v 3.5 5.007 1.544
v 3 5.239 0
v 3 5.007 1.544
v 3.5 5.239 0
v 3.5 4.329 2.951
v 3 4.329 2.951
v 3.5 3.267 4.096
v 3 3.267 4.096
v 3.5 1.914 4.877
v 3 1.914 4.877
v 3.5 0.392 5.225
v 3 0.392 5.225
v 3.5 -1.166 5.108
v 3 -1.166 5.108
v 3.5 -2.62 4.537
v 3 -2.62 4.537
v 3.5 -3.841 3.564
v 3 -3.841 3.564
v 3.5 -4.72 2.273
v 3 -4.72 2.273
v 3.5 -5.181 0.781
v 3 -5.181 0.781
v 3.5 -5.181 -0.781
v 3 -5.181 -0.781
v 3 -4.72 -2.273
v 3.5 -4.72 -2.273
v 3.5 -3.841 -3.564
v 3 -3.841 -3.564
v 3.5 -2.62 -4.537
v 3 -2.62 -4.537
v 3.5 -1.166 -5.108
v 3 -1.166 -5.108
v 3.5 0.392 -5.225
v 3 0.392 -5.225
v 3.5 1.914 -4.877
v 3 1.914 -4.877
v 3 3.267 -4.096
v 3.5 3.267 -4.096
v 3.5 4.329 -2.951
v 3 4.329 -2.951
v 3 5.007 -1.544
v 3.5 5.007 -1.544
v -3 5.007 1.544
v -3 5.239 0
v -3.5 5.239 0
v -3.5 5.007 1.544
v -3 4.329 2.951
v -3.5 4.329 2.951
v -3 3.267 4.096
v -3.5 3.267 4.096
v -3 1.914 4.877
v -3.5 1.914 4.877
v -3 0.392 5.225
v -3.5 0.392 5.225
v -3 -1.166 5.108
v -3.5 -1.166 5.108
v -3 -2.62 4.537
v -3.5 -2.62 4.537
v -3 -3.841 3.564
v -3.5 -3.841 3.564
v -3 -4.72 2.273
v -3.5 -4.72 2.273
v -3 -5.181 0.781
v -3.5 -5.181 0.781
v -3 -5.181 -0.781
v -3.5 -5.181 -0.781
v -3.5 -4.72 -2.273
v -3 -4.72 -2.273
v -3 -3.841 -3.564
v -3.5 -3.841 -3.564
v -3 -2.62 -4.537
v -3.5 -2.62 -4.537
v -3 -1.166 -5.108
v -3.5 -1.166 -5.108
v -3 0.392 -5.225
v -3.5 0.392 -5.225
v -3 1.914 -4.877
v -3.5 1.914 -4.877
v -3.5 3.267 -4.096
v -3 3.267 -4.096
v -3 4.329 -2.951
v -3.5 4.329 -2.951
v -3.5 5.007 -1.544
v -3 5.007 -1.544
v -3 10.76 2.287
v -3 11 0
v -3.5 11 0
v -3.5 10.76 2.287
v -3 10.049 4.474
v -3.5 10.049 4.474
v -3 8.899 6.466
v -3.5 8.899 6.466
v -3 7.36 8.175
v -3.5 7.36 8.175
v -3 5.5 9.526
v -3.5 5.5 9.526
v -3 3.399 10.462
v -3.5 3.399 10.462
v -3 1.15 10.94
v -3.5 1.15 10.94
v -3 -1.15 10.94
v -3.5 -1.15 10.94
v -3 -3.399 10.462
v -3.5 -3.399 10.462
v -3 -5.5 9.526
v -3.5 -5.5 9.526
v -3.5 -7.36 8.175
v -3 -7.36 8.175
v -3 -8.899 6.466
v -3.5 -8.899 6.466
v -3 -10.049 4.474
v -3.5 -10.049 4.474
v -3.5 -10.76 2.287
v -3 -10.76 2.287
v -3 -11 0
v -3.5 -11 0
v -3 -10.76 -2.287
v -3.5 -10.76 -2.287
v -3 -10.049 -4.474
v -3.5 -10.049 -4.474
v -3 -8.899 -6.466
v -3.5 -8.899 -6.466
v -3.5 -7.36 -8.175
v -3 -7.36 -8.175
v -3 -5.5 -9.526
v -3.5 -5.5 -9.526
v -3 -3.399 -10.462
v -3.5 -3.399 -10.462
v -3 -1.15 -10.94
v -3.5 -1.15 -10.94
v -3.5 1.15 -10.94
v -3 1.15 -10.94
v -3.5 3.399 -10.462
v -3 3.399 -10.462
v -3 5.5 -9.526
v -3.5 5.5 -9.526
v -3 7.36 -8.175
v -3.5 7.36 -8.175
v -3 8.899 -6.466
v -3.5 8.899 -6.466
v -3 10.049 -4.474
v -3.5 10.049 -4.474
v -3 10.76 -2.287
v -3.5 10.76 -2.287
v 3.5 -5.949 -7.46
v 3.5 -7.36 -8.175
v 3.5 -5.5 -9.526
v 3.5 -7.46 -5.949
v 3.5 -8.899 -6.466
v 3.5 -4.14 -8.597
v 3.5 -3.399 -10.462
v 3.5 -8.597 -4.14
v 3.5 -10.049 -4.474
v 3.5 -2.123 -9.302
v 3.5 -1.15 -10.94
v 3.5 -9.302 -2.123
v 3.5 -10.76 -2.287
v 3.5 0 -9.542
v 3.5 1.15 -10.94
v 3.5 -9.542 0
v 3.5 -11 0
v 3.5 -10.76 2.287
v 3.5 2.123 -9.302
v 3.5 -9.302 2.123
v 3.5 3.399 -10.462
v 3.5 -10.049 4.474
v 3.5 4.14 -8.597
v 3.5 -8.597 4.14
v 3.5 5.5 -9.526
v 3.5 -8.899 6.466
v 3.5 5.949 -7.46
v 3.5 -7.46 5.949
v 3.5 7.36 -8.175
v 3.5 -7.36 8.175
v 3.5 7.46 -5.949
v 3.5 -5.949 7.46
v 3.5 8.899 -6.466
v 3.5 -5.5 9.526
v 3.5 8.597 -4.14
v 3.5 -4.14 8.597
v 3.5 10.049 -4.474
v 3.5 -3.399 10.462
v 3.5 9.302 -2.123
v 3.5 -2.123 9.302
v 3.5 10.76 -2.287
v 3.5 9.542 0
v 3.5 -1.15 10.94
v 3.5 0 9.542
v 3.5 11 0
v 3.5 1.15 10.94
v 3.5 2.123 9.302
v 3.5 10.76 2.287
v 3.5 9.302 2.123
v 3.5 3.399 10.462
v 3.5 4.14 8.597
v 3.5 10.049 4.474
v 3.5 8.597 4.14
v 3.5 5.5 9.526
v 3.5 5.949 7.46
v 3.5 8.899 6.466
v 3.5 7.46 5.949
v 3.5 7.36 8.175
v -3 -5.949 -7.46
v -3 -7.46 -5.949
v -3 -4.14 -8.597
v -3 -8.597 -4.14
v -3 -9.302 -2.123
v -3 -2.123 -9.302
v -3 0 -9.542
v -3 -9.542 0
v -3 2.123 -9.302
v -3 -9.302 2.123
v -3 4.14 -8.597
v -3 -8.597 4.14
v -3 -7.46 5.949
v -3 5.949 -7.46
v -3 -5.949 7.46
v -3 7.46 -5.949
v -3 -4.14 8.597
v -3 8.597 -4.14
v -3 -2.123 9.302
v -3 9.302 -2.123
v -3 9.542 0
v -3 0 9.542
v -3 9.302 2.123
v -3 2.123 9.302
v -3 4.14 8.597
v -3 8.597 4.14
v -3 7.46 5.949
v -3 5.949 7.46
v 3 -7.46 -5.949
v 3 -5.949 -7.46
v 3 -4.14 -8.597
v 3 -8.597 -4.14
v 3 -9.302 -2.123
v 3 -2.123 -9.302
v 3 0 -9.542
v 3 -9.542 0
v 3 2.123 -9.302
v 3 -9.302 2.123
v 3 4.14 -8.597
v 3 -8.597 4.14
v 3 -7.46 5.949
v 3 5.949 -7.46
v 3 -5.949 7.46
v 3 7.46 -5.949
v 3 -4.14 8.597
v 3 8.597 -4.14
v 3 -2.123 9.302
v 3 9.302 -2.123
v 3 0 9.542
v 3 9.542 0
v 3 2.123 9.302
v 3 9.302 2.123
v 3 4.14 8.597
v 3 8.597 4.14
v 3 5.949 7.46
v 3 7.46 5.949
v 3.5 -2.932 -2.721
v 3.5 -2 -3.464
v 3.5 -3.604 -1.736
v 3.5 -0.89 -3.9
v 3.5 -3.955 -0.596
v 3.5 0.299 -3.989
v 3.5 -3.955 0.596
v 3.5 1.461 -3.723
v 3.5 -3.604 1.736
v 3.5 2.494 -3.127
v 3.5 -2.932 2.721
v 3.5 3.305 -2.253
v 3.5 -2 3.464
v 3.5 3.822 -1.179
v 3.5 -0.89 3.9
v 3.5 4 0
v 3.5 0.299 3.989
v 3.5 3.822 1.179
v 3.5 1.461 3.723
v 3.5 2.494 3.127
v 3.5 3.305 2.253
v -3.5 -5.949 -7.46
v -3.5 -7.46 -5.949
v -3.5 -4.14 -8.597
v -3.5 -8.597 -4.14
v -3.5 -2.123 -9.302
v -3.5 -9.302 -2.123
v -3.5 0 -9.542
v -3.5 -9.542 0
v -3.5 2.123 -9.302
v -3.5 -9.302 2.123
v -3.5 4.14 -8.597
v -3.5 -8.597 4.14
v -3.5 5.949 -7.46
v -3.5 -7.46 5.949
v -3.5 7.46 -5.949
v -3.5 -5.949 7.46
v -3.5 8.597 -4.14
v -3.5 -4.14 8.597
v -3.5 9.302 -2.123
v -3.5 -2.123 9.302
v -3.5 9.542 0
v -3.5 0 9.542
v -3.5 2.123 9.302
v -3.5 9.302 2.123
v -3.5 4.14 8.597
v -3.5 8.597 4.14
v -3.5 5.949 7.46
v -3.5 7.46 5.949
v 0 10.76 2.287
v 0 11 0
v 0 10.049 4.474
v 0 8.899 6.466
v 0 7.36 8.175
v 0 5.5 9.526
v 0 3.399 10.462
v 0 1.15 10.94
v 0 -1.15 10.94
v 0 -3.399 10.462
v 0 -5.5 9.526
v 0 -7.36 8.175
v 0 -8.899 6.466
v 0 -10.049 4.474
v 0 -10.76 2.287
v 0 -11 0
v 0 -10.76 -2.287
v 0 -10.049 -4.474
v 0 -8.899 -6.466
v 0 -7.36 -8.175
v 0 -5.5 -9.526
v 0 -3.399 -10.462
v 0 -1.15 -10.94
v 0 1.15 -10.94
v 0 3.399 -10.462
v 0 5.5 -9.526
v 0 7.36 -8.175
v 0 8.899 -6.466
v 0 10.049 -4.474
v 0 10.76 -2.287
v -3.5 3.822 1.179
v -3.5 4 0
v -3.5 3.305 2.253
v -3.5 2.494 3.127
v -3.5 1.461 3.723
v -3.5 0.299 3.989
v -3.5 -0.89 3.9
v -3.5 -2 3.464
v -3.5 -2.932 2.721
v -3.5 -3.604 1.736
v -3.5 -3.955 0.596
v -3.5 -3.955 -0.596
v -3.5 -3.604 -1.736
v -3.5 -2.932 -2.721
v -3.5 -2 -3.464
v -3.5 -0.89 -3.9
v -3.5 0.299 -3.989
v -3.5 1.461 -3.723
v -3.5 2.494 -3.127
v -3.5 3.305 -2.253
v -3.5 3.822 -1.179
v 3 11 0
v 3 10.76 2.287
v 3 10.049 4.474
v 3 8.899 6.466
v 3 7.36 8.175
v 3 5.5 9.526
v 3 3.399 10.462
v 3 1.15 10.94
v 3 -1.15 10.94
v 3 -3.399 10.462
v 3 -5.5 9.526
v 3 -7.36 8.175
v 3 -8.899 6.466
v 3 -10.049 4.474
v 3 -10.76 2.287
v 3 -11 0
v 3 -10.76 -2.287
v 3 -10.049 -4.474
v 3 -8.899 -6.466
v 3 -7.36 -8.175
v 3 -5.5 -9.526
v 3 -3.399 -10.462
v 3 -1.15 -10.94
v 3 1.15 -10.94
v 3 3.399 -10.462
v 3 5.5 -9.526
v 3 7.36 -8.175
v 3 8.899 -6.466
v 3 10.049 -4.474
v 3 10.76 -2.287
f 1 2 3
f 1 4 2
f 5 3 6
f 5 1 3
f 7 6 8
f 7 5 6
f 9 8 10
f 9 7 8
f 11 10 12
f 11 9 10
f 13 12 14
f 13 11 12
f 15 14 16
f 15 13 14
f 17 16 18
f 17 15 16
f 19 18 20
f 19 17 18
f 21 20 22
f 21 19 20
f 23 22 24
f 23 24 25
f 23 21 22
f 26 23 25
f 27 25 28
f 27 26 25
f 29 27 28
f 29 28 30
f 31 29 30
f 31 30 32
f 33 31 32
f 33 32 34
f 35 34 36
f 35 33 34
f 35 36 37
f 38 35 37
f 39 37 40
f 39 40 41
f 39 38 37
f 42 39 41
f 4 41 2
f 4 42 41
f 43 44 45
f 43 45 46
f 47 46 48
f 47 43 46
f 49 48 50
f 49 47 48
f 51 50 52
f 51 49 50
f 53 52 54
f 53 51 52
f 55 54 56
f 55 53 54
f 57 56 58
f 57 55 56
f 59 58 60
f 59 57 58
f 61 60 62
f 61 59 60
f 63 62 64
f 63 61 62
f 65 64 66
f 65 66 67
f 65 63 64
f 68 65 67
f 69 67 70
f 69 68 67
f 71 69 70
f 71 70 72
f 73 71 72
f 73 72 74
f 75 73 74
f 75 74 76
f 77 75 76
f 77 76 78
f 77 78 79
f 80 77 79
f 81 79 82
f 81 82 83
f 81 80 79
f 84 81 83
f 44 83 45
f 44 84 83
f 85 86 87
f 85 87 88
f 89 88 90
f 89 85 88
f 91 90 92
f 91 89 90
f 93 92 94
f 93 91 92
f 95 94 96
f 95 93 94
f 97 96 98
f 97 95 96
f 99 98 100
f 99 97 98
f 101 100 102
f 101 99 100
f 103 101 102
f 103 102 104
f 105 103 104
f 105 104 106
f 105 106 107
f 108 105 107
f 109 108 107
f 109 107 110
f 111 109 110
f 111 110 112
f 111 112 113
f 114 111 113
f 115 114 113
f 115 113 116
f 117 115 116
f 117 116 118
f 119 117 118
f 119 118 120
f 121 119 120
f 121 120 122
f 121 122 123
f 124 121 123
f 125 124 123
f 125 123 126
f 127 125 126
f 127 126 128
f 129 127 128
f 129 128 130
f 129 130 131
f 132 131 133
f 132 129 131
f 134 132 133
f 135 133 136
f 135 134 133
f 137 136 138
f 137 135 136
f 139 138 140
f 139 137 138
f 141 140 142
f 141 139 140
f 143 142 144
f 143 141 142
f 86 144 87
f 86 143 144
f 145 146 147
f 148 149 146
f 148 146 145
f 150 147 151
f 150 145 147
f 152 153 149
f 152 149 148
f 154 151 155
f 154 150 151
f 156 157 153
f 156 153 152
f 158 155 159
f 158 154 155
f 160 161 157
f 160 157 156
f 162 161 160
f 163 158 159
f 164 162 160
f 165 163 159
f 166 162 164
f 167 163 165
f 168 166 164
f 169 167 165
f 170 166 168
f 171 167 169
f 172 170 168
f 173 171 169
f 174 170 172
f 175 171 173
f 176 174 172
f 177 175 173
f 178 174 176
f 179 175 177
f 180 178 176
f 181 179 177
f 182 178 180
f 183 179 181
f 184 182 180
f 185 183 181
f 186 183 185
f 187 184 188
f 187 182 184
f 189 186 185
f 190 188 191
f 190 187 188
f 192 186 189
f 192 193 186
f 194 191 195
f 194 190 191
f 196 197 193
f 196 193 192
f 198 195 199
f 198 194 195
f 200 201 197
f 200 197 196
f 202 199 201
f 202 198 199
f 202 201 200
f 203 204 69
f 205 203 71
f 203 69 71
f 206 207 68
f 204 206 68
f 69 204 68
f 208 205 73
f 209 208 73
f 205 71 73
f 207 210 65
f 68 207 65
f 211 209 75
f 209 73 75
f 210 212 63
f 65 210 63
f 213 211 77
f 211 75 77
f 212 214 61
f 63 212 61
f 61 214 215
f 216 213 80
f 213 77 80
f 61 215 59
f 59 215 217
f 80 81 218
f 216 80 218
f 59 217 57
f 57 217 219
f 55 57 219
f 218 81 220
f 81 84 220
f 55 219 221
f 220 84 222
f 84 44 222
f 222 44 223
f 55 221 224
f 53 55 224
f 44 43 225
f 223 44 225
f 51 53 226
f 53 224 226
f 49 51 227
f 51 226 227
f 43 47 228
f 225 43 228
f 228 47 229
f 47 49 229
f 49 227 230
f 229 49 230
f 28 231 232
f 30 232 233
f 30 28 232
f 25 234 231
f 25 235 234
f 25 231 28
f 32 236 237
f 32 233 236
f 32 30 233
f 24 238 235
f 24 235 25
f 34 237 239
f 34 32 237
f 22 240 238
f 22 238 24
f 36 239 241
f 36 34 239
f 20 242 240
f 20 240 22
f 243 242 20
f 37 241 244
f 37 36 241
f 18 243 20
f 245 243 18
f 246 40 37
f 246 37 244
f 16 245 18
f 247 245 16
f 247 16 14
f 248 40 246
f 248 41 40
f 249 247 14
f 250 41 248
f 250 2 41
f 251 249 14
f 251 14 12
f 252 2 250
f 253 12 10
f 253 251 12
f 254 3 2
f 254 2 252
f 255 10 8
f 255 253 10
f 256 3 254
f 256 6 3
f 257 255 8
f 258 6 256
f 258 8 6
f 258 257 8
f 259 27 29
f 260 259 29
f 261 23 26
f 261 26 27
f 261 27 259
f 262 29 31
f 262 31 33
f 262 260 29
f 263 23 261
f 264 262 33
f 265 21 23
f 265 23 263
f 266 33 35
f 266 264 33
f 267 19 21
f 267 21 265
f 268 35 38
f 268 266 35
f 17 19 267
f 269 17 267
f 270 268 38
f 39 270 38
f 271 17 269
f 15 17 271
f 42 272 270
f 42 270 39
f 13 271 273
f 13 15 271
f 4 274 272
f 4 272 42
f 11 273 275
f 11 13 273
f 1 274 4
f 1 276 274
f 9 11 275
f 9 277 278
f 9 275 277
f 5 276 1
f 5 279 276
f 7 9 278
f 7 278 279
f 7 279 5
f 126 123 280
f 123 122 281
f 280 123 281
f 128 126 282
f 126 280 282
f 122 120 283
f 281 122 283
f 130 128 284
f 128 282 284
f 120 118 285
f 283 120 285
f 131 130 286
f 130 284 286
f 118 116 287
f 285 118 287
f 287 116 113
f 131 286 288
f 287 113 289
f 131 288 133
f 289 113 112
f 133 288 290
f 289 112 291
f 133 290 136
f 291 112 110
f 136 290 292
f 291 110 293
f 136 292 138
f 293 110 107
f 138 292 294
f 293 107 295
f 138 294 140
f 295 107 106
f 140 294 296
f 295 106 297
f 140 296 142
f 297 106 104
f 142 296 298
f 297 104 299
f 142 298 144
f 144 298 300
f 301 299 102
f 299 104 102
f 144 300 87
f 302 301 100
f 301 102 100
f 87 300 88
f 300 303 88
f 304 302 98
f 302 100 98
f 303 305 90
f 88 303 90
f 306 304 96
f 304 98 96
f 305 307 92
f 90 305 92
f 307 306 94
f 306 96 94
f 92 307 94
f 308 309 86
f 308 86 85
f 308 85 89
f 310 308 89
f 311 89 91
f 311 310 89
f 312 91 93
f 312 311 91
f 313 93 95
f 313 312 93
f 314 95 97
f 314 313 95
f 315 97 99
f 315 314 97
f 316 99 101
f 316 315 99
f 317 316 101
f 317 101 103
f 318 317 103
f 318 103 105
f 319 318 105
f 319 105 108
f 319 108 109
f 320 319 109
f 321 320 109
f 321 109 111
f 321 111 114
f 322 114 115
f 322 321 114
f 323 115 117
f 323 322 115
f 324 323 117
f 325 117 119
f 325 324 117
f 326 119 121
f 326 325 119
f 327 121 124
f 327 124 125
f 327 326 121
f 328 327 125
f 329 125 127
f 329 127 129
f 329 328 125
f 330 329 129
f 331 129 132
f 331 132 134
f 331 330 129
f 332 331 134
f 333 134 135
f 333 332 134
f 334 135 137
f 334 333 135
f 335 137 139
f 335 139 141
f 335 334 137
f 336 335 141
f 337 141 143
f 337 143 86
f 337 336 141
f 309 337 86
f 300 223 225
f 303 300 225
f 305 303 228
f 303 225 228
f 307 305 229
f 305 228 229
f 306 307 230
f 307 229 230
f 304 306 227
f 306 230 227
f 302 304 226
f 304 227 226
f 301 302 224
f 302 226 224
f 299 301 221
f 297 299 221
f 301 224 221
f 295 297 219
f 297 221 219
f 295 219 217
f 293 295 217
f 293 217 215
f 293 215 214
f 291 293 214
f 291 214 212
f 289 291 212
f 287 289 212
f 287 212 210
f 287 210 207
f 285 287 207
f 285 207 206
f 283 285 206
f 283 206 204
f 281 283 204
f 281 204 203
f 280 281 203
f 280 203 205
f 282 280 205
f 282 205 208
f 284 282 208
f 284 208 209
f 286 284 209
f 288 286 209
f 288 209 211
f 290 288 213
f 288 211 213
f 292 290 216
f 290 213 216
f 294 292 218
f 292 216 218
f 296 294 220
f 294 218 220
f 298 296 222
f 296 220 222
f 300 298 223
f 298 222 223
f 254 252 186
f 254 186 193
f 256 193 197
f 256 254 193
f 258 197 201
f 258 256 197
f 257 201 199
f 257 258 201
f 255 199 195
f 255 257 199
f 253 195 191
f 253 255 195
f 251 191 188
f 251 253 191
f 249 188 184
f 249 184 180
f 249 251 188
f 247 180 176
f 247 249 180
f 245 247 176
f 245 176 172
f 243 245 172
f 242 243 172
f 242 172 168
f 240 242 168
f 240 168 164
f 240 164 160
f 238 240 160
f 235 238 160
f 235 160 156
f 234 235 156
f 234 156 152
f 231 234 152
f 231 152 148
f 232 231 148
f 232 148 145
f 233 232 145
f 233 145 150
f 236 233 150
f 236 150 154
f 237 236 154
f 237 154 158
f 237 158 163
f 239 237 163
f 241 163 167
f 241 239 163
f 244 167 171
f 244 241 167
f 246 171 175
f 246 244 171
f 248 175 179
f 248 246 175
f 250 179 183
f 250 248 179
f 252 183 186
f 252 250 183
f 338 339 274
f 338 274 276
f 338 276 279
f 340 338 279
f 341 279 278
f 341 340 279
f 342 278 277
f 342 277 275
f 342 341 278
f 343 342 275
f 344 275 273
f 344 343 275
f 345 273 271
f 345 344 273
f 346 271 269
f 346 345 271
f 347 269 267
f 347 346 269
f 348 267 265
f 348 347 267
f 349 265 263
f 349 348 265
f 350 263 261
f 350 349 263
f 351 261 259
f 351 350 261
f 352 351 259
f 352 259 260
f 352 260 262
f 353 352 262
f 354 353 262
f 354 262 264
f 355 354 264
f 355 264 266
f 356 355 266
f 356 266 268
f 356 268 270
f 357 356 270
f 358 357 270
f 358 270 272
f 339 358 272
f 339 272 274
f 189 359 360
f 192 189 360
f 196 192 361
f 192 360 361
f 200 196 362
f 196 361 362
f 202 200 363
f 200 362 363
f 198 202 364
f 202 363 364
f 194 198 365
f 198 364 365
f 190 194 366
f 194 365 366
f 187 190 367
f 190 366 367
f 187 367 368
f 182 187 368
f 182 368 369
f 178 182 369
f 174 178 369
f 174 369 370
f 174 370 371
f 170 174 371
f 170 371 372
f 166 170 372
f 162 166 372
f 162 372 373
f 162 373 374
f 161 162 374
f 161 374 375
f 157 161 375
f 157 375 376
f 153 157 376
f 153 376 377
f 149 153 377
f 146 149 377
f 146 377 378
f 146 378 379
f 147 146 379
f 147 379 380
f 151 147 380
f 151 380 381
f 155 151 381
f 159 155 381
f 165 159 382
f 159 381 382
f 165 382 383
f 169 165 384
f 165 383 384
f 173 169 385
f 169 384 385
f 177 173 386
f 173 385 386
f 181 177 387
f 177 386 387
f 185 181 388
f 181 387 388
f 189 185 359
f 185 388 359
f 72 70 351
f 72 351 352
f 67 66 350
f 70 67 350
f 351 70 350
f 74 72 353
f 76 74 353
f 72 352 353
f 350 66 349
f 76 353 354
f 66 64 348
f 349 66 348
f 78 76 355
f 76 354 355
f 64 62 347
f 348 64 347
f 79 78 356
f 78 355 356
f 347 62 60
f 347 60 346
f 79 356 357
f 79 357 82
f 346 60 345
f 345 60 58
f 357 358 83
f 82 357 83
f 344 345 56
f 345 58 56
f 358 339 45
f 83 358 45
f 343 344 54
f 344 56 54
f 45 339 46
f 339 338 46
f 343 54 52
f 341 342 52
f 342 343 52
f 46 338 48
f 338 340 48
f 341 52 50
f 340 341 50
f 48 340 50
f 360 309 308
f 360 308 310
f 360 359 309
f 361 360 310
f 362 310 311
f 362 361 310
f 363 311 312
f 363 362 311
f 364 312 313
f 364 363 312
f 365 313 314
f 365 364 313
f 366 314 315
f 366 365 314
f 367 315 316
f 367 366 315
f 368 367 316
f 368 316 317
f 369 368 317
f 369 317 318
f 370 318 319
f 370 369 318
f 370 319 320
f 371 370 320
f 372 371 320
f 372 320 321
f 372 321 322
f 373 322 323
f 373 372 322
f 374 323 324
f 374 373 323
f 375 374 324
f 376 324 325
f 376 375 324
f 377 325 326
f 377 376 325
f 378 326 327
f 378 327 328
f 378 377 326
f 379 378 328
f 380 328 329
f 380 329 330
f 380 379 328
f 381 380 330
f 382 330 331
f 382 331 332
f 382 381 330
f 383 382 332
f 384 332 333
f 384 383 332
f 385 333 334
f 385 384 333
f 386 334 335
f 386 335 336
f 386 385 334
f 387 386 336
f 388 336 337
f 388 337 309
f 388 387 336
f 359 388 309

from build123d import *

# Parameters (mm, degrees)
F0_R     = 11
F0_R_2   = 4
F1_DEPTH = 3
F2_R     = 11
F2_R_2   = 9.5415407764
F2_R_3   = 5.2393235044
F2_R_4   = 4
F3_DEPTH = 3.5


with BuildPart() as f1:
    # F0 (on Right) → F1 (new body, symmetric)
    with BuildSketch(Plane.YZ):
        Circle(F0_R)
        Circle(F0_R_2, mode=Mode.SUBTRACT)
    extrude(amount=F1_DEPTH, both=True)

    # F2 (on Right) → F3 (join, symmetric)
    with BuildSketch(Plane.YZ):
        Circle(F2_R)
        Circle(F2_R_2, mode=Mode.SUBTRACT)
        Circle(F2_R_3)
        Circle(F2_R_4, mode=Mode.SUBTRACT)
    extrude(amount=F3_DEPTH, both=True)


solid = f1.part
